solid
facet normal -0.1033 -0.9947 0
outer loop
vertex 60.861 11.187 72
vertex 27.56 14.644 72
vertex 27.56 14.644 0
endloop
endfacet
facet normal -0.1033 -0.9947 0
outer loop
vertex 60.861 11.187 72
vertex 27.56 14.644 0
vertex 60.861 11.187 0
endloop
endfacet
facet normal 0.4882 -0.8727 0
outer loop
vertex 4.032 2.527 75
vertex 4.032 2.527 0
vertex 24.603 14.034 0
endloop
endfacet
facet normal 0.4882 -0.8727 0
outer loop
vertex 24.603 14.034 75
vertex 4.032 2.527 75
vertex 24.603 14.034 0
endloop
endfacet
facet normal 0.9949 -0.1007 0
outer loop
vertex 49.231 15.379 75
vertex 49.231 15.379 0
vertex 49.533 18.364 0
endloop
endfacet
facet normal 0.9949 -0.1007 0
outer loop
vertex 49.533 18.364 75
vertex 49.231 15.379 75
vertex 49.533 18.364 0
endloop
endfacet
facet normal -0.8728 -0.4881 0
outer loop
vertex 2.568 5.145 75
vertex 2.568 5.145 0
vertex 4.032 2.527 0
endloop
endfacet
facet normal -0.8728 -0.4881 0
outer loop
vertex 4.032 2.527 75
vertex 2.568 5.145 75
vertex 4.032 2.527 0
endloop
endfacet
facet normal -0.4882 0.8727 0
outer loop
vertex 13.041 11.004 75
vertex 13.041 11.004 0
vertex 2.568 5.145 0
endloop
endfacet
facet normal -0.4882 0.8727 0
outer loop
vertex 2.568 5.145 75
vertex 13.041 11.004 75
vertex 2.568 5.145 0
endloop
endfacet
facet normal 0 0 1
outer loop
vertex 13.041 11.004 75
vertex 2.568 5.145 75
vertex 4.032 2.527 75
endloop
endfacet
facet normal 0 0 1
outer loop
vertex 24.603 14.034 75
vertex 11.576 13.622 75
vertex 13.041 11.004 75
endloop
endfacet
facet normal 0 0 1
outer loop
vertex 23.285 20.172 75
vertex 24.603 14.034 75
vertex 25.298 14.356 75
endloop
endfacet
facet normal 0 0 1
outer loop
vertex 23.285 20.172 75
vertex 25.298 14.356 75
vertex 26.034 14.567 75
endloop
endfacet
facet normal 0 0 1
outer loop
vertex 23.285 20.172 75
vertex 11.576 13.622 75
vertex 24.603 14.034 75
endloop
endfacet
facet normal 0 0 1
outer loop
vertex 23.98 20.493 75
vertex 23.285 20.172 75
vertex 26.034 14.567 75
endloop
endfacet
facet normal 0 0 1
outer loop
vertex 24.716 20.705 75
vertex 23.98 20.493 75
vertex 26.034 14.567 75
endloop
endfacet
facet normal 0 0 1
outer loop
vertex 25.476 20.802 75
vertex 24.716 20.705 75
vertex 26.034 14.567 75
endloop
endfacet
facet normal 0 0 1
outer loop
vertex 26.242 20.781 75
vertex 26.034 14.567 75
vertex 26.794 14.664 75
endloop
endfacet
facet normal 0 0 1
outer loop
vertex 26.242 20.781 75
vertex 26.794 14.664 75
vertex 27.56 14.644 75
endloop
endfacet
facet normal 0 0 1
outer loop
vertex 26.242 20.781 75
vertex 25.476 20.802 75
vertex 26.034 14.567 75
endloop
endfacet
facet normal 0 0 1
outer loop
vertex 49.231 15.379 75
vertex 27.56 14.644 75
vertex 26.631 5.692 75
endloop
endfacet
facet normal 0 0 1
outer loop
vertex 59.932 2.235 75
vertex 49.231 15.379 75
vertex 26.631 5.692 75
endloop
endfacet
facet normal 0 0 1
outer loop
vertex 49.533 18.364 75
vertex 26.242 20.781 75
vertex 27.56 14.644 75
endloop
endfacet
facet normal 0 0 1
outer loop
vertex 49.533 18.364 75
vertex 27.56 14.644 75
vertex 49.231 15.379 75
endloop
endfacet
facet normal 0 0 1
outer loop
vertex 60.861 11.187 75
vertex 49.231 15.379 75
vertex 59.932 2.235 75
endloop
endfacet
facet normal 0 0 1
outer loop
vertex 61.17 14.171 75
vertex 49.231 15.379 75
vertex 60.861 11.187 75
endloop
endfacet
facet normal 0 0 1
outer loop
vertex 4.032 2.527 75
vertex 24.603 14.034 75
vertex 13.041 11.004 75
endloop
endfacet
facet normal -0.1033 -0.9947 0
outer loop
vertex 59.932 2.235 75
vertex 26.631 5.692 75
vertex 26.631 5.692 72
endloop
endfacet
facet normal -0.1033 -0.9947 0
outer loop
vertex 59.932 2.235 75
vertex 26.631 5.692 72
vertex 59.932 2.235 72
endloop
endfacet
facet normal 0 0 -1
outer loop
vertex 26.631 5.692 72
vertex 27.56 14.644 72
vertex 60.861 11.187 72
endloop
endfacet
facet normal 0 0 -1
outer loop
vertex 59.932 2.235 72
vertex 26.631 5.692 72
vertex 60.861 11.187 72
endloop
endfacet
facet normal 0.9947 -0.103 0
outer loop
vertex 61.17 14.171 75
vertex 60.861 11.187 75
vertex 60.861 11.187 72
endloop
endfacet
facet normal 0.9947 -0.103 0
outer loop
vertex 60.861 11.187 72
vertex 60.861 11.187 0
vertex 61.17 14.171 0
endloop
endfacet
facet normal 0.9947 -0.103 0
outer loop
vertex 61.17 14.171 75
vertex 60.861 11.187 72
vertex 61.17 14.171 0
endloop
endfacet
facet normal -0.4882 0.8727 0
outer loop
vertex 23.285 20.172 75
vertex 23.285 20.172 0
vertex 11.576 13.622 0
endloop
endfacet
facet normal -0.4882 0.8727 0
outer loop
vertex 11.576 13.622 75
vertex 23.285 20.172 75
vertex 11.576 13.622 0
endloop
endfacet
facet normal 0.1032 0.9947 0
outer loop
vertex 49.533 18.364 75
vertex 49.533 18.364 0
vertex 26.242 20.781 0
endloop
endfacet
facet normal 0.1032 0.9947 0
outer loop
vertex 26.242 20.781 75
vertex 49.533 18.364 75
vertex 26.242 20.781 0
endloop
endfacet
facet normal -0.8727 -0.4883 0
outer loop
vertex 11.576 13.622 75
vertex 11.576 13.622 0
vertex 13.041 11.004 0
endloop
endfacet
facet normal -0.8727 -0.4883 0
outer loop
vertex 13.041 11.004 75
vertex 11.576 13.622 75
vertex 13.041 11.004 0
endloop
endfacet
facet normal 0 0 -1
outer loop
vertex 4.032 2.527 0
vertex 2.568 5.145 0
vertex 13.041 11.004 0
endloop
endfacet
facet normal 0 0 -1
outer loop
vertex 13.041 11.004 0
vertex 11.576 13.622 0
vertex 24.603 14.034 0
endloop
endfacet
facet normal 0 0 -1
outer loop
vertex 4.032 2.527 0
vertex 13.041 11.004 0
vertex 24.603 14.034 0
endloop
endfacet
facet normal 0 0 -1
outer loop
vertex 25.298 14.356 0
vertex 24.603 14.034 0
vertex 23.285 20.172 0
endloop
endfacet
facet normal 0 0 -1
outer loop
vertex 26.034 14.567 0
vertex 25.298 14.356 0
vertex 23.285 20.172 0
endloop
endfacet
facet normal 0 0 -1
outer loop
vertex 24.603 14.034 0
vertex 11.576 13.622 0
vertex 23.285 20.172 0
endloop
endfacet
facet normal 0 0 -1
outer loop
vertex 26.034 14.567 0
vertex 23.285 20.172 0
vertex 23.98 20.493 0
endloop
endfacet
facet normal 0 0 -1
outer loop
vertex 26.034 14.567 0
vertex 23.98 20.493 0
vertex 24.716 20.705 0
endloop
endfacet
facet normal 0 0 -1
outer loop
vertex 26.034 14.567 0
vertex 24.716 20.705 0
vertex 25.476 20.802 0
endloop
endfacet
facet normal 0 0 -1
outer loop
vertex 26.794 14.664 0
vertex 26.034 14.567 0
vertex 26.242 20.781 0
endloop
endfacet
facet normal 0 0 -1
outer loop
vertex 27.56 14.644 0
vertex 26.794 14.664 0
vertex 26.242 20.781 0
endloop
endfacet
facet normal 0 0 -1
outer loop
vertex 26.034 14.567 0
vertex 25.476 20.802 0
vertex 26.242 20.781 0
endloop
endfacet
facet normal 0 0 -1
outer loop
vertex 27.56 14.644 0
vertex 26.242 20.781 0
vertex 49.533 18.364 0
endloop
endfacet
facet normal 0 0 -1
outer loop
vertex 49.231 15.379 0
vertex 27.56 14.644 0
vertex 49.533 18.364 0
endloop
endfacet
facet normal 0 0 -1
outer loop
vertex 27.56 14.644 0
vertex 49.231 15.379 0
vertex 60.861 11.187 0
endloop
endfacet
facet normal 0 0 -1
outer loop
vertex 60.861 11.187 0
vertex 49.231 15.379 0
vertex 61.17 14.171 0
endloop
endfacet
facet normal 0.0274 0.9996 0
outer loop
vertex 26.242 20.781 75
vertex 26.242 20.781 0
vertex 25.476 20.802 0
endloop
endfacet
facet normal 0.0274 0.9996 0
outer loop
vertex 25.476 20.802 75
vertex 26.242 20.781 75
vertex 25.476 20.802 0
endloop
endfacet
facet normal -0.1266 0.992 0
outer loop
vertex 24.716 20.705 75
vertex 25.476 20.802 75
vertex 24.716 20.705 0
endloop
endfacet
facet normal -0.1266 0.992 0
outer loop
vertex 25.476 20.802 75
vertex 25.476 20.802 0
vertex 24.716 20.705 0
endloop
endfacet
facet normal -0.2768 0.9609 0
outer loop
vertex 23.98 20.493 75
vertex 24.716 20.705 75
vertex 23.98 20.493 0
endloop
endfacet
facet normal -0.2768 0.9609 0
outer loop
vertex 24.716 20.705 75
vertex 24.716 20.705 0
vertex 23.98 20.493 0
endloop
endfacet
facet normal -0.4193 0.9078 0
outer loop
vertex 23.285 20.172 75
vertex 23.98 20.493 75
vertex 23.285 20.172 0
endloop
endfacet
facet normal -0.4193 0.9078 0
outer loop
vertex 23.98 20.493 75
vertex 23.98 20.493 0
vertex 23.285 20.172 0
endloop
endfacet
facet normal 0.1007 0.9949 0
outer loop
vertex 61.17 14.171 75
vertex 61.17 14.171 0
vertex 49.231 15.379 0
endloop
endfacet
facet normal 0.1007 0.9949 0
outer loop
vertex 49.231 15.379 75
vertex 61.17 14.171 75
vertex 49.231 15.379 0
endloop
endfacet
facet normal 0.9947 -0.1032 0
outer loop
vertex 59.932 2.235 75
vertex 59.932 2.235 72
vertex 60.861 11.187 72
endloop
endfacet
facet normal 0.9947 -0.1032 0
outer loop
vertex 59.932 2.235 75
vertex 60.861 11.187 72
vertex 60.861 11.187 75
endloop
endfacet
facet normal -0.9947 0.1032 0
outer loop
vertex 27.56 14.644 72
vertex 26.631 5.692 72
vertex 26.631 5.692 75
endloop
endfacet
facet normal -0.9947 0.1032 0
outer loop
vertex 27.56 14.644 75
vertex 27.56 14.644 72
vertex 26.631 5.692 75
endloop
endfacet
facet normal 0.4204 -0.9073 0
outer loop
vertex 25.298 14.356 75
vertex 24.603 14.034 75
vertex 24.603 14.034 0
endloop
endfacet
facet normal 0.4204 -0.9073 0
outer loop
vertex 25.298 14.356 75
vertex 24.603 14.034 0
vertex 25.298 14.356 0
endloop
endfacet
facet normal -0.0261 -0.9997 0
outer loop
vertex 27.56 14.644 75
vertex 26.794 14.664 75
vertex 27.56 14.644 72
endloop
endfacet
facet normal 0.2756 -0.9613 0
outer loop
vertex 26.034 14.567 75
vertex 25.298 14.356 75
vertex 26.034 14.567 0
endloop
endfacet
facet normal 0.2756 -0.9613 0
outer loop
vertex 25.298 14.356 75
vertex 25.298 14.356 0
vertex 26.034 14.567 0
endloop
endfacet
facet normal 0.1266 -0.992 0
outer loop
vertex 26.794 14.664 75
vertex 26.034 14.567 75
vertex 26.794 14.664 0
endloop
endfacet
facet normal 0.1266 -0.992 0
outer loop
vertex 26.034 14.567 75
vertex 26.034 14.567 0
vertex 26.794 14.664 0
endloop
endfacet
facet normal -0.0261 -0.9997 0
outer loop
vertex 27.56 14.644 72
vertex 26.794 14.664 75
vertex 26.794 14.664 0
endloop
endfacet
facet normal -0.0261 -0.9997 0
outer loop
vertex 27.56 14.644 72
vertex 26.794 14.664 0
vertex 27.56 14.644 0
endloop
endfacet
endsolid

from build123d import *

# Parameters (mm, degrees)
BOSS_EXTRUDE1_DEPTH = 75
SKETCH2_W           = 33.479779341
SKETCH2_H           = 3
BOSS_EXTRUDE2_DEPTH = 9


with BuildPart() as part:
    # Sketch1 → Boss-Extrude1 (new body)
    with BuildSketch(Plane.XY):
        with BuildLine():
            Line((11.575975539, 13.62181128), (13.040589352, 11.003623667))
            Line((13.040589352, 11.003623667), (2.567838899, 5.145168413))
            Line((2.567838899, 5.145168413), (4.032452713, 2.5269808))
            Line((4.032452713, 2.5269808), (24.602620365, 14.033929934))
            ThreePointArc((24.602620365, 14.033929934), (26.034093135, 14.56730426), (27.559801463, 14.643570636))
            Line((27.559801463, 14.643570636), (60.860709888, 11.187398941))
            Line((60.860709888, 11.187398941), (61.170404733, 14.171370975))
            Line((61.170404733, 14.171370975), (49.231357904, 15.379328261))
            Line((49.231357904, 15.379328261), (49.533347225, 18.364089968))
            Line((49.533347225, 18.364089968), (26.242046455, 20.781403438))
            ThreePointArc((26.242046455, 20.781403438), (24.716338127, 20.705137062), (23.284865357, 20.171762736))
            Line((23.284865357, 20.171762736), (11.575975539, 13.62181128))
        make_face()
    extrude(amount=BOSS_EXTRUDE1_DEPTH)

    # Sketch2 → Boss-Extrude2 (add)
    with BuildSketch(Plane(origin=(1.797301431, 17.317360261, 0), x_dir=(0.9946573448357569, -0.10323161513936713, 0), z_dir=(-0.10323161513936711, -0.9946573448357567, 0))):
        with Locations((42.64076917, 73.5)):
            Rectangle(SKETCH2_W, SKETCH2_H)
    extrude(amount=BOSS_EXTRUDE2_DEPTH)


solid = part.part
